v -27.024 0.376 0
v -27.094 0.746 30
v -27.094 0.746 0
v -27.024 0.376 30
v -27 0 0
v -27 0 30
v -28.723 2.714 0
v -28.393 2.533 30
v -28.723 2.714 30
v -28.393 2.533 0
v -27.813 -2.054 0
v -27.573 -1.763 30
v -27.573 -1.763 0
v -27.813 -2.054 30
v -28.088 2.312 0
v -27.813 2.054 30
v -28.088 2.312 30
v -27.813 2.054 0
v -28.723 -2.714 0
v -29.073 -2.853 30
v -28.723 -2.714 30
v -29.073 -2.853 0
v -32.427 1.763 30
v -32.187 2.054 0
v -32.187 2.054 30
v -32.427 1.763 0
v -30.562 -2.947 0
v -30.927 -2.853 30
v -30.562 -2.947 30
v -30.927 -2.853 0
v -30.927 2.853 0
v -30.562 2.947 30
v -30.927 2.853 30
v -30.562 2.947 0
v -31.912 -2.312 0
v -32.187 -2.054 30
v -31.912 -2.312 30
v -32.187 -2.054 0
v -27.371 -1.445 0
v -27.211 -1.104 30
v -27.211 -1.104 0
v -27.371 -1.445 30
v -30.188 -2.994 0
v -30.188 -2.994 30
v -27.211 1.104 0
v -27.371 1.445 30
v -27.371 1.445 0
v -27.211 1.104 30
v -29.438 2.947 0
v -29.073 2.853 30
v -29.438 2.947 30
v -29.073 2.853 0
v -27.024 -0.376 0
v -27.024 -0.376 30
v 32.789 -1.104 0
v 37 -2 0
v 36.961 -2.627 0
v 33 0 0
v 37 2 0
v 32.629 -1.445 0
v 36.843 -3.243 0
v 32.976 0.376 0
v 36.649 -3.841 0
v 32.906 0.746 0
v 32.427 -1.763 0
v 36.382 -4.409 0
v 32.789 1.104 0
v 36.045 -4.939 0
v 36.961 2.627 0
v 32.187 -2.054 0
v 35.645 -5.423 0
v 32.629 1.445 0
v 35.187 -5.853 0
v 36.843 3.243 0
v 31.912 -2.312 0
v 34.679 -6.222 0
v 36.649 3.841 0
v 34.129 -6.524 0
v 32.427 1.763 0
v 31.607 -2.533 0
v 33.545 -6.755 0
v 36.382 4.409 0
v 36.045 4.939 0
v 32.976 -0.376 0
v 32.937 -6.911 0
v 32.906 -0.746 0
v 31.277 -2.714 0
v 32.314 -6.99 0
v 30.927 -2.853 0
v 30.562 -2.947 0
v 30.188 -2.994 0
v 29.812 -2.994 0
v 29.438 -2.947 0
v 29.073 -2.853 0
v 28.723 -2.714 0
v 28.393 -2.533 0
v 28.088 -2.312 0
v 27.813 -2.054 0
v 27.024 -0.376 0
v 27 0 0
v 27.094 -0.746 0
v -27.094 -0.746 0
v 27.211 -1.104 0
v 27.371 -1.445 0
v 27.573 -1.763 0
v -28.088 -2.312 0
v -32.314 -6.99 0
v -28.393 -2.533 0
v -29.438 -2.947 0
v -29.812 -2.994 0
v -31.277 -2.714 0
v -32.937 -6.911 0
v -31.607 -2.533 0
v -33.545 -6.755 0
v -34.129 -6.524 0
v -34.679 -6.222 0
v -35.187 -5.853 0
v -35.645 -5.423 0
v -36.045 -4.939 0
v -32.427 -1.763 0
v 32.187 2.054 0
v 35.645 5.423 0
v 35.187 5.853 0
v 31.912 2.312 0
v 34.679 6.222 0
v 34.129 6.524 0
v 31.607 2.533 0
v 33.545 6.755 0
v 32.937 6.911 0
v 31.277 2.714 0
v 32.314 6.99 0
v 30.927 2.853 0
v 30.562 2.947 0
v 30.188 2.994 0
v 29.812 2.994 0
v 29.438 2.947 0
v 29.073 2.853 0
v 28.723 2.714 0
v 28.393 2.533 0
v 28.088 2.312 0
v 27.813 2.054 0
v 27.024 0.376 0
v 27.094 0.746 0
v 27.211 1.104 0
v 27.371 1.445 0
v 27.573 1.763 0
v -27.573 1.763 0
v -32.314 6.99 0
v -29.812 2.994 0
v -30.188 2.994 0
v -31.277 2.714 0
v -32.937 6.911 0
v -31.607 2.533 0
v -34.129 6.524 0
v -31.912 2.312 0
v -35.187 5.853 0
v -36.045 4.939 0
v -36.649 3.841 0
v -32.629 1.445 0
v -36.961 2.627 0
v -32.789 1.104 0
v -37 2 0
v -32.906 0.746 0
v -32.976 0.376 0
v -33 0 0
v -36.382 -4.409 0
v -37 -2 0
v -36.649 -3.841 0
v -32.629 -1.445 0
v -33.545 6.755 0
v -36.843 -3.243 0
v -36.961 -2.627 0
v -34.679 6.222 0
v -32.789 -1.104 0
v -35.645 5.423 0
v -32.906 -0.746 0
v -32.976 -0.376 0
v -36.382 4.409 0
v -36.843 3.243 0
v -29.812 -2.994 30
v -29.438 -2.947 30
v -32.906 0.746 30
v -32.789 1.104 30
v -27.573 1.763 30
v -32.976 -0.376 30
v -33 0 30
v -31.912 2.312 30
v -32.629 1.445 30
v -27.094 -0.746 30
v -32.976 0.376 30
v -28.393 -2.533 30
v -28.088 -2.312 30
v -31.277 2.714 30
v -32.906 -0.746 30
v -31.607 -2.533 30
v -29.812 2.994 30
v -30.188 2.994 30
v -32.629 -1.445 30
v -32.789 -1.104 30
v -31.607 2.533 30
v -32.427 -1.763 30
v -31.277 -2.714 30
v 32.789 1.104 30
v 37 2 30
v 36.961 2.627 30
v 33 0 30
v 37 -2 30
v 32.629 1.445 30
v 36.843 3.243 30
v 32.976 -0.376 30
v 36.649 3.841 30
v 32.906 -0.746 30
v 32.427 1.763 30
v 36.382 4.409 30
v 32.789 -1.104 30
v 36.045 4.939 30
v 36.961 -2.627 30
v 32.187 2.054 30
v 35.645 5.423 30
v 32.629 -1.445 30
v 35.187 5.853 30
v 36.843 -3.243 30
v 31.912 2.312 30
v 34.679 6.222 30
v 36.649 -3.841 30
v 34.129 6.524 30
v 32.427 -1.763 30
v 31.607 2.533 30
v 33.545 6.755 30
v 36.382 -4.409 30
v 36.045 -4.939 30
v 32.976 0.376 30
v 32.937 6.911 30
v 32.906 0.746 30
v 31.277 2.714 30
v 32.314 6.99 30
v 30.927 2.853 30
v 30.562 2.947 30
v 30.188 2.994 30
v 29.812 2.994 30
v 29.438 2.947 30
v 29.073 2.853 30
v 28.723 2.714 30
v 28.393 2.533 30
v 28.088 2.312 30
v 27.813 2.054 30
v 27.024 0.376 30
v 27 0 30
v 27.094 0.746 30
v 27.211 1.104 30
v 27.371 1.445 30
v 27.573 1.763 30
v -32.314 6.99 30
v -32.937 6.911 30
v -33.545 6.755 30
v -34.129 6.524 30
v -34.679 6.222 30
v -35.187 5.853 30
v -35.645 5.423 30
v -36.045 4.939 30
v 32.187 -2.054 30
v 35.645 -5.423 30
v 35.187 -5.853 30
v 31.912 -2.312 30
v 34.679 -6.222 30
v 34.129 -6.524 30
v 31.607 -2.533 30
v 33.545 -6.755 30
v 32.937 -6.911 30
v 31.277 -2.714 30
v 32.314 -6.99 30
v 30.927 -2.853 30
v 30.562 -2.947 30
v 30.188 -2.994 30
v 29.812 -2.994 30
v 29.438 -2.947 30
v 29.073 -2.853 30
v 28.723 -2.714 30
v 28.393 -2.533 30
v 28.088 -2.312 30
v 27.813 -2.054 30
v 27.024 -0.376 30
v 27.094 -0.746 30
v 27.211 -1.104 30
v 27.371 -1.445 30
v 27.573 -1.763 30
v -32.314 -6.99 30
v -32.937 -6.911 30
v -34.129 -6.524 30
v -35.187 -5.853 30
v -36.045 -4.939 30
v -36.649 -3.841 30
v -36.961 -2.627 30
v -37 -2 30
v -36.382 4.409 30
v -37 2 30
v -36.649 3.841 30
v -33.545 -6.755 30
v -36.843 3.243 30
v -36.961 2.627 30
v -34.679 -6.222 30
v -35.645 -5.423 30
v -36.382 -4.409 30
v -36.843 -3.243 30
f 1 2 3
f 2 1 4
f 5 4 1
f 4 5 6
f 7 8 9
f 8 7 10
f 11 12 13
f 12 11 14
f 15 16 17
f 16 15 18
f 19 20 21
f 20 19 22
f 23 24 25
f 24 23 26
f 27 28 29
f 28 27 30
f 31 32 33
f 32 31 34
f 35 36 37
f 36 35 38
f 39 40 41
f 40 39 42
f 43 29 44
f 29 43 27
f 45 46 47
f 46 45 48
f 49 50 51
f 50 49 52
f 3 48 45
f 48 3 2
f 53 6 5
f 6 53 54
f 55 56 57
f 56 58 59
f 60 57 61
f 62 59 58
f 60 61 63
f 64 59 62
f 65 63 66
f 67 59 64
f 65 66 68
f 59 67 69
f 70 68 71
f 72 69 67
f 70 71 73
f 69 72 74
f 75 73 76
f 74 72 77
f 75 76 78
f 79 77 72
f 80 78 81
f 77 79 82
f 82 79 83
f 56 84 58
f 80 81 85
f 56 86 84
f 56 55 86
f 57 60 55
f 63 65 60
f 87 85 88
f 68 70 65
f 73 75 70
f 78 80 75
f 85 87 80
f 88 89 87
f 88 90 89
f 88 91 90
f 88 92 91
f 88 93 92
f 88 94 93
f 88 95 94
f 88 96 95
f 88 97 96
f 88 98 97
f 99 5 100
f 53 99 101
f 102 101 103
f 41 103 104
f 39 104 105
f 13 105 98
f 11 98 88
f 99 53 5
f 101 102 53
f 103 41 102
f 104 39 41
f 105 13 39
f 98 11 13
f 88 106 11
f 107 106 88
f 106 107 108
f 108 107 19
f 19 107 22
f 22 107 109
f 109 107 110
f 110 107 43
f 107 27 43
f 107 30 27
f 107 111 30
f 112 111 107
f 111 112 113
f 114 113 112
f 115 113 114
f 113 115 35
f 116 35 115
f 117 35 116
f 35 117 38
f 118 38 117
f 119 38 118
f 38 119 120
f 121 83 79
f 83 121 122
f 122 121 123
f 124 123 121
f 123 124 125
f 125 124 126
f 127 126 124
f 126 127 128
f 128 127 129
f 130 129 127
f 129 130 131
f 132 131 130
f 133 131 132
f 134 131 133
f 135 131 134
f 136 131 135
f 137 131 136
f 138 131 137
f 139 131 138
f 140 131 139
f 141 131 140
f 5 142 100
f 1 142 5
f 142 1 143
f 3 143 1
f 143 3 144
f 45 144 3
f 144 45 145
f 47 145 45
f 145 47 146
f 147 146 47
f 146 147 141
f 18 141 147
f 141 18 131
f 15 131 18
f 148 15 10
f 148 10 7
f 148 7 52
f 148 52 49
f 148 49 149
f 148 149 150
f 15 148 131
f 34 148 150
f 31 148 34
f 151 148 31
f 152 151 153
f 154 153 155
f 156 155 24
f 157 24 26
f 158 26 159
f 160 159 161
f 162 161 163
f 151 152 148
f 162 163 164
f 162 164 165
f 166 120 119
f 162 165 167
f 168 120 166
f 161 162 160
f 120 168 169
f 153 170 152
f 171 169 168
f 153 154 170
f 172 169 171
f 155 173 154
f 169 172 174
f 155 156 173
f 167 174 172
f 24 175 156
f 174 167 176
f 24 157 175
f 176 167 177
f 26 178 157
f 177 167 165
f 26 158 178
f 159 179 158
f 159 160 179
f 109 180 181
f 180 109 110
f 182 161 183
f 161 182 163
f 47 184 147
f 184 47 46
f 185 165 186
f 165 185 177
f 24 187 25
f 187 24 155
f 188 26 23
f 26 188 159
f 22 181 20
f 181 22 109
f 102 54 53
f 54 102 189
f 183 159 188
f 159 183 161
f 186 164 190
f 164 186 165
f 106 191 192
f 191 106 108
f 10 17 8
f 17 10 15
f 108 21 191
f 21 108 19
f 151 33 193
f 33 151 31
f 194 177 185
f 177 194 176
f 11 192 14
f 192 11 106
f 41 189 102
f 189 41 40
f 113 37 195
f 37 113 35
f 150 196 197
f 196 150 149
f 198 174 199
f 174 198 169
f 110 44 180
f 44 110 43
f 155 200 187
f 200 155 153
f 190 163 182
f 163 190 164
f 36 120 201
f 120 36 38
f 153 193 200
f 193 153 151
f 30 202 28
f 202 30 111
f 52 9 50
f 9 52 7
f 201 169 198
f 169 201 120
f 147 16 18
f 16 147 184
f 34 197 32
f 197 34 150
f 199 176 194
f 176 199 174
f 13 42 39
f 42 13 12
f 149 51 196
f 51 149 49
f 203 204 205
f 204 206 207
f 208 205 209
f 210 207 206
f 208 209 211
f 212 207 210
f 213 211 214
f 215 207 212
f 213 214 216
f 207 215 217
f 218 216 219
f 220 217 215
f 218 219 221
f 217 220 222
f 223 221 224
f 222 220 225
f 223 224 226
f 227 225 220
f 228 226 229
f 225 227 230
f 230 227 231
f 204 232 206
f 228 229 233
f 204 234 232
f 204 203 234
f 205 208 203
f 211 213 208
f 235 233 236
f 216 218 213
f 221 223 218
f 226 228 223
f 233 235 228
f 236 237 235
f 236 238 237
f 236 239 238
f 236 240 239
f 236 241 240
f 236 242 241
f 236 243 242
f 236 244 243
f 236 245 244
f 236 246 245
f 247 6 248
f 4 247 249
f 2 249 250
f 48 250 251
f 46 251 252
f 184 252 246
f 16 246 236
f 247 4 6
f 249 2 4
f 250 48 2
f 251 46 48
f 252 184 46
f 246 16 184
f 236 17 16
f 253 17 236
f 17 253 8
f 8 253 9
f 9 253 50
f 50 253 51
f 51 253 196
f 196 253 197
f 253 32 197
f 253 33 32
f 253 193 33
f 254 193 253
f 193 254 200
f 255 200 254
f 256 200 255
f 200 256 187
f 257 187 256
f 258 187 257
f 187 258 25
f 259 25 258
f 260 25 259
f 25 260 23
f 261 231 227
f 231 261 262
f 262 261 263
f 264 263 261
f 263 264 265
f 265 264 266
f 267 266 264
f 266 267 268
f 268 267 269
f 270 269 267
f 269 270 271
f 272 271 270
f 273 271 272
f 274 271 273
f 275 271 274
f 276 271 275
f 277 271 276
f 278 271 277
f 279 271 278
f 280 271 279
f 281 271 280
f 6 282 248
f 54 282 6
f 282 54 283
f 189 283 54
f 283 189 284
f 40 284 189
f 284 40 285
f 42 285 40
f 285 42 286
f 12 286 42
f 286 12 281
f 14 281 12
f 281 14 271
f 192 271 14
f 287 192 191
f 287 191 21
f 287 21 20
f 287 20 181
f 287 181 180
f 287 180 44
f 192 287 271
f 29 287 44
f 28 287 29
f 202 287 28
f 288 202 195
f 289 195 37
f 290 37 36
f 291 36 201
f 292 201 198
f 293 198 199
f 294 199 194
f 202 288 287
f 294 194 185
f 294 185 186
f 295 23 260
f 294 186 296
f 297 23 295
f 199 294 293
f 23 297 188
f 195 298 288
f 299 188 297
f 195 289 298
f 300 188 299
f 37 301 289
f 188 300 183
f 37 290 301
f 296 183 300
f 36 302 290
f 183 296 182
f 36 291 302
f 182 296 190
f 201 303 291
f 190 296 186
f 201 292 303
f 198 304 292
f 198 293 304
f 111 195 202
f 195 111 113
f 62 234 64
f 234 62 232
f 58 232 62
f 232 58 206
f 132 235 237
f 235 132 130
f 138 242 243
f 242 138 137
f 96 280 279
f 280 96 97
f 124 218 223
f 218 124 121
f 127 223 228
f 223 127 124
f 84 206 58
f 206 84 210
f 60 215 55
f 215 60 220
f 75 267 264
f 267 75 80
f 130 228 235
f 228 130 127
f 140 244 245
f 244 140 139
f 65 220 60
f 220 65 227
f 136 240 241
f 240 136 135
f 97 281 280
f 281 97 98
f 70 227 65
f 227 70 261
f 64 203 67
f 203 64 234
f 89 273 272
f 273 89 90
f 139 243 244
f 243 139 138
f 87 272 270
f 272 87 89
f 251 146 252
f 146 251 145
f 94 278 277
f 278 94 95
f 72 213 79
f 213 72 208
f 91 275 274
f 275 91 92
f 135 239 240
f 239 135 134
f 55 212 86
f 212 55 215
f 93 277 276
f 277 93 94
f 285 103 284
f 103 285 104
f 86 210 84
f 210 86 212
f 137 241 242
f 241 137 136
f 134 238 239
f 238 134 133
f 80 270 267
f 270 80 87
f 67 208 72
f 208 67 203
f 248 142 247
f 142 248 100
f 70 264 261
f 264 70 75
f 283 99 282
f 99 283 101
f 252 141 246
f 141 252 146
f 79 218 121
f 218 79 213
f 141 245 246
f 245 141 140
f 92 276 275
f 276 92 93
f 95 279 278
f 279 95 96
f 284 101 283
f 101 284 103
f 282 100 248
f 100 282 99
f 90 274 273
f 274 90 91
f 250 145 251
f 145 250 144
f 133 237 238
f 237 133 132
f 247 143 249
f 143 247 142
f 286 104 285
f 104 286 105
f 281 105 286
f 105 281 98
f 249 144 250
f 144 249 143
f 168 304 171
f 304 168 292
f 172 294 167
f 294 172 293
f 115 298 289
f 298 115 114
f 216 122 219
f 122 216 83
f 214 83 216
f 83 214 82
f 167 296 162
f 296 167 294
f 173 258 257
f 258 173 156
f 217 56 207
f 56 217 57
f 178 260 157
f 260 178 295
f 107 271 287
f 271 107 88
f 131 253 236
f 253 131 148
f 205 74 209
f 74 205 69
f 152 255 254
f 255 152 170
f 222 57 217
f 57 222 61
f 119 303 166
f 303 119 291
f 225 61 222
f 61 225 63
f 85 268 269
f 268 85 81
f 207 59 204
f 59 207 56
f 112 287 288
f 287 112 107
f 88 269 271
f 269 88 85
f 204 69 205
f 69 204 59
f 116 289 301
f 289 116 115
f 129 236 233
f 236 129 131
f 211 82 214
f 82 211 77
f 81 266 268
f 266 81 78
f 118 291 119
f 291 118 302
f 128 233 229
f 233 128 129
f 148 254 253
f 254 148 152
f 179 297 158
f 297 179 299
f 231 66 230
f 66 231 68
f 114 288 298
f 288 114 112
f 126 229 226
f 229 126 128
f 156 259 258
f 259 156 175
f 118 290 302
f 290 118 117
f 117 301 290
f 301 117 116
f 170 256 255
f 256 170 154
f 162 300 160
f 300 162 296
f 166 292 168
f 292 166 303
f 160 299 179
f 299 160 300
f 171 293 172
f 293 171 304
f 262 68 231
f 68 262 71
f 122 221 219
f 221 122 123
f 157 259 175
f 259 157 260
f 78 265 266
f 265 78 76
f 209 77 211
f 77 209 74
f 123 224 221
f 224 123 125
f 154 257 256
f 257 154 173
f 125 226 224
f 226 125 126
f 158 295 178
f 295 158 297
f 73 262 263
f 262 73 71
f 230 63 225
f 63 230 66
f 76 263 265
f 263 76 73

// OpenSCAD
$fn = 50;


difference() {
	union() {
		hull() {
			translate(v = [-32.0000000000, 2.0000000000, 0]) {
				cylinder(h = 30, r = 5);
			}
			translate(v = [32.0000000000, 2.0000000000, 0]) {
				cylinder(h = 30, r = 5);
			}
			translate(v = [-32.0000000000, -2.0000000000, 0]) {
				cylinder(h = 30, r = 5);
			}
			translate(v = [32.0000000000, -2.0000000000, 0]) {
				cylinder(h = 30, r = 5);
			}
		}
	}
	union() {
		translate(v = [-30.0000000000, 0.0000000000, 0]) {
			cylinder(h = 30, r = 3.0000000000);
		}
		translate(v = [30.0000000000, 0.0000000000, 0]) {
			cylinder(h = 30, r = 3.0000000000);
		}
		translate(v = [-30.0000000000, 0.0000000000, 0]) {
			cylinder(h = 30, r = 1.5000000000);
		}
		translate(v = [30.0000000000, 0.0000000000, 0]) {
			cylinder(h = 30, r = 1.5000000000);
		}
		translate(v = [-30.0000000000, 0.0000000000, 0]) {
			cylinder(h = 30, r = 1.5000000000);
		}
		translate(v = [30.0000000000, 0.0000000000, 0]) {
			cylinder(h = 30, r = 1.5000000000);
		}
		translate(v = [-30.0000000000, 0.0000000000, 0]) {
			cylinder(h = 30, r = 1.5000000000);
		}
		translate(v = [30.0000000000, 0.0000000000, 0]) {
			cylinder(h = 30, r = 1.5000000000);
		}
	}
}
